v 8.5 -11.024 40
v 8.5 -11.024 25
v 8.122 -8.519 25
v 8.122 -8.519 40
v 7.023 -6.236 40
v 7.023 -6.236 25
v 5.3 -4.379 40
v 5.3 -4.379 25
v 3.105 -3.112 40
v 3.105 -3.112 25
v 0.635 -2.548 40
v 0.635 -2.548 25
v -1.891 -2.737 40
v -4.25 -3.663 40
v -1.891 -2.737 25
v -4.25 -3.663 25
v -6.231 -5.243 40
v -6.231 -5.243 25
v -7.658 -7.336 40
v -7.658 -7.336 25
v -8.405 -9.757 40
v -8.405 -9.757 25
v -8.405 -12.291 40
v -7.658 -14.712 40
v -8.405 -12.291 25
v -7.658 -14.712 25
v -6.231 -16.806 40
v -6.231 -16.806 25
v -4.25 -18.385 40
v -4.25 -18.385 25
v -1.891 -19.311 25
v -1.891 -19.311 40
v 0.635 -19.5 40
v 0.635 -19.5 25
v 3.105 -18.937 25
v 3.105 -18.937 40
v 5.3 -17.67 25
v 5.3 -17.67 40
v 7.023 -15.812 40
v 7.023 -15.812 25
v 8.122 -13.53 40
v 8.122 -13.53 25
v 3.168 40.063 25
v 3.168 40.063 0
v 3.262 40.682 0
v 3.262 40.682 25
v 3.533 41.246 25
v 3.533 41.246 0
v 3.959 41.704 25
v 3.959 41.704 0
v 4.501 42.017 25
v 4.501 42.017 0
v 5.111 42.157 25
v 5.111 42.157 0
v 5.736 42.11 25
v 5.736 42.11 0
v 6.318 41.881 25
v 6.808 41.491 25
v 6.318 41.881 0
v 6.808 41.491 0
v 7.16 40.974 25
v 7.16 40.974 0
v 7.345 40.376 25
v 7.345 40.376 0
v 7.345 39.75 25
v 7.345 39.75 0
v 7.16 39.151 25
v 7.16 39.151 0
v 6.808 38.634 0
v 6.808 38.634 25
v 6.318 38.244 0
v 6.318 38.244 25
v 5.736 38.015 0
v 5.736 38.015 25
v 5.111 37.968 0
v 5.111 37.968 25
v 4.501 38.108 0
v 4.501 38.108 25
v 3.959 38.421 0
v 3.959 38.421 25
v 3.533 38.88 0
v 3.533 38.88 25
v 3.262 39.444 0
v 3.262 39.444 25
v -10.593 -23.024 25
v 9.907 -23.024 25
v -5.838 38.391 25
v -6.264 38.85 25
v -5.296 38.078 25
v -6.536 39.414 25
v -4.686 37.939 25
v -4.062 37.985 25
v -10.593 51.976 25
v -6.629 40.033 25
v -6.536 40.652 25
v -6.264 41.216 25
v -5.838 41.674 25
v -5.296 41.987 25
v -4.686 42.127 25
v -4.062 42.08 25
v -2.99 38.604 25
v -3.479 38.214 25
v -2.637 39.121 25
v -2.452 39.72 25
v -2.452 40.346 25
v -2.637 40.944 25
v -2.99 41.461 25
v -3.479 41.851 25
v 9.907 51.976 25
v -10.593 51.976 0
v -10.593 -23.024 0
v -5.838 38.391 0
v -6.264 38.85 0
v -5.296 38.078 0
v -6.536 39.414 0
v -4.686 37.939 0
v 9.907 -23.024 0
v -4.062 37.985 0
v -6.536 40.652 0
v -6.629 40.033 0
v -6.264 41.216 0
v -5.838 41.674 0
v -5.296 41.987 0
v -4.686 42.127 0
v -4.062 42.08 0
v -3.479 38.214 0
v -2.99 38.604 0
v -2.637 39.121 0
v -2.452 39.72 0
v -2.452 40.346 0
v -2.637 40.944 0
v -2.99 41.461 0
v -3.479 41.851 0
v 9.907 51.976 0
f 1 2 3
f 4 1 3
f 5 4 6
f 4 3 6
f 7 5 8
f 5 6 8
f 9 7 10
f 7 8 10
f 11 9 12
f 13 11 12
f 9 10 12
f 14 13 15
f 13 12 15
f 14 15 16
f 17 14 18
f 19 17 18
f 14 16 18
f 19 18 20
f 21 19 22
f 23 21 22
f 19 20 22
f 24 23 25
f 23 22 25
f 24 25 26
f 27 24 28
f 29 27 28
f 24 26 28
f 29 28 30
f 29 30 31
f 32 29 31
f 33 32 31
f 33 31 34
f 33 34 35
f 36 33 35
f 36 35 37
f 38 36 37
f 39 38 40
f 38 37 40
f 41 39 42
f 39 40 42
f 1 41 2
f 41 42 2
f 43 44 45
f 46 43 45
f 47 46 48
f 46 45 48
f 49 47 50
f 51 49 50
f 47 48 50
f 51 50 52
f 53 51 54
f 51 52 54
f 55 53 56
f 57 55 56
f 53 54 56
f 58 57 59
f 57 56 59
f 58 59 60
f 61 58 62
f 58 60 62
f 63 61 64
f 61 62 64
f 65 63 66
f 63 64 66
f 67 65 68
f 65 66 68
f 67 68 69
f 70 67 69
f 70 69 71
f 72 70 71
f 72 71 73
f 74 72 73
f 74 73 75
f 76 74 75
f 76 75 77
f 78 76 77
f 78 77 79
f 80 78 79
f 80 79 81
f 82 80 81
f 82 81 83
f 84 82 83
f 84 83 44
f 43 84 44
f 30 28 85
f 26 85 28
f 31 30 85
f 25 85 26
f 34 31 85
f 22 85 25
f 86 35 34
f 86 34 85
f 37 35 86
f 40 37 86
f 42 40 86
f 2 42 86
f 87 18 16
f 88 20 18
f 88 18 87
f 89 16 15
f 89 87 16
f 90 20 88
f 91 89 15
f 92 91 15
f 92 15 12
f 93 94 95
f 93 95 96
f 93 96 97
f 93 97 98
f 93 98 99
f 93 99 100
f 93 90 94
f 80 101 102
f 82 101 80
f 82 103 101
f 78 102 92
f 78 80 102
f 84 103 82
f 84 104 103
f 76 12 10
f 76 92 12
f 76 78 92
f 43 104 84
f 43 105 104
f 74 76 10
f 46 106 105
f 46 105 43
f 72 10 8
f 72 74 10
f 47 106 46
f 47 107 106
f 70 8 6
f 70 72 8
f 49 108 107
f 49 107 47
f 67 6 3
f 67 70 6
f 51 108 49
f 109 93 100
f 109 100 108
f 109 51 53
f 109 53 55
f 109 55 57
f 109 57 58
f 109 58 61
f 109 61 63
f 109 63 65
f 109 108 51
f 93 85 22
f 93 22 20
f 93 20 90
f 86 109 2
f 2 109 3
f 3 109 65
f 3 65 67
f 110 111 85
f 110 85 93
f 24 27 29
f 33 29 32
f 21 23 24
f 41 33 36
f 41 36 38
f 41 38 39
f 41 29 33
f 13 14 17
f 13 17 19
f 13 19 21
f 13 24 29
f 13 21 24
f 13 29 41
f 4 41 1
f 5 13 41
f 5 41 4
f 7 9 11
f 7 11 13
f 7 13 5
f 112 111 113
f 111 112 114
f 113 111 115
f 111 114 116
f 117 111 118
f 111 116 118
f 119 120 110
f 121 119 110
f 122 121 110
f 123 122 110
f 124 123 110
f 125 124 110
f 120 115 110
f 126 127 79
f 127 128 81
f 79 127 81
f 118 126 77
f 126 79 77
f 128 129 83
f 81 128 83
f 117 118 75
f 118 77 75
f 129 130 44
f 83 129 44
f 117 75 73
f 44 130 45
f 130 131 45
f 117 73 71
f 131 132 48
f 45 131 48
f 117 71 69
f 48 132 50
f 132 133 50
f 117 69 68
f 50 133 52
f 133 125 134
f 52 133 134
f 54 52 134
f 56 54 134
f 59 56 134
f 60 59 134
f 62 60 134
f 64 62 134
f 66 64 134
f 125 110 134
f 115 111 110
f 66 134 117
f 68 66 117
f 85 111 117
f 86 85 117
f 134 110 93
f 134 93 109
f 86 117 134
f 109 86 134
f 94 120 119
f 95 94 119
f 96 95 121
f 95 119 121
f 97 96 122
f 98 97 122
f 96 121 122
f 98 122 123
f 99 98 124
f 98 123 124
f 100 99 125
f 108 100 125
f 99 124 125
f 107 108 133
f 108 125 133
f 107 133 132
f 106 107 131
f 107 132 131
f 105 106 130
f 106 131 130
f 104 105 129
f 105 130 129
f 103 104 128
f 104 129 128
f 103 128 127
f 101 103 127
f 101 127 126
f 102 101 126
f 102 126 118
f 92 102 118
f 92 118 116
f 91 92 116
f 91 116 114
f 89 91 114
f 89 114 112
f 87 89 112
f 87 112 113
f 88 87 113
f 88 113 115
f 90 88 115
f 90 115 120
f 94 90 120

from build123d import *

# Parameters (mm, degrees)
F0_W     = 20.5
F0_H     = 75
F1_DEPTH = 25
F2_R     = 8.5
F3_DEPTH = 15
F5_D     = 4.2


with BuildPart() as f1:
    # F0 (on Top) → F1 (new body)
    with BuildSketch(Plane.XY):
        with Locations((-0.3433860838, 14.475764136)):
            Rectangle(F0_W, F0_H)
    extrude(amount=F1_DEPTH)

    # F2 (on face) → F3 (join)
    with BuildSketch(Plane.XY.offset(25)):
        with Locations((0, -11.024235864)):
            Circle(F2_R)
    extrude(amount=F3_DEPTH)

    # F5 (through all)
    with Locations(Plane.XY.offset(25)):
        with Locations((-4.5289483146, 40.0326289237), (5.268279344, 40.0625547821)):
            Hole(F5_D / 2)


solid = f1.part
